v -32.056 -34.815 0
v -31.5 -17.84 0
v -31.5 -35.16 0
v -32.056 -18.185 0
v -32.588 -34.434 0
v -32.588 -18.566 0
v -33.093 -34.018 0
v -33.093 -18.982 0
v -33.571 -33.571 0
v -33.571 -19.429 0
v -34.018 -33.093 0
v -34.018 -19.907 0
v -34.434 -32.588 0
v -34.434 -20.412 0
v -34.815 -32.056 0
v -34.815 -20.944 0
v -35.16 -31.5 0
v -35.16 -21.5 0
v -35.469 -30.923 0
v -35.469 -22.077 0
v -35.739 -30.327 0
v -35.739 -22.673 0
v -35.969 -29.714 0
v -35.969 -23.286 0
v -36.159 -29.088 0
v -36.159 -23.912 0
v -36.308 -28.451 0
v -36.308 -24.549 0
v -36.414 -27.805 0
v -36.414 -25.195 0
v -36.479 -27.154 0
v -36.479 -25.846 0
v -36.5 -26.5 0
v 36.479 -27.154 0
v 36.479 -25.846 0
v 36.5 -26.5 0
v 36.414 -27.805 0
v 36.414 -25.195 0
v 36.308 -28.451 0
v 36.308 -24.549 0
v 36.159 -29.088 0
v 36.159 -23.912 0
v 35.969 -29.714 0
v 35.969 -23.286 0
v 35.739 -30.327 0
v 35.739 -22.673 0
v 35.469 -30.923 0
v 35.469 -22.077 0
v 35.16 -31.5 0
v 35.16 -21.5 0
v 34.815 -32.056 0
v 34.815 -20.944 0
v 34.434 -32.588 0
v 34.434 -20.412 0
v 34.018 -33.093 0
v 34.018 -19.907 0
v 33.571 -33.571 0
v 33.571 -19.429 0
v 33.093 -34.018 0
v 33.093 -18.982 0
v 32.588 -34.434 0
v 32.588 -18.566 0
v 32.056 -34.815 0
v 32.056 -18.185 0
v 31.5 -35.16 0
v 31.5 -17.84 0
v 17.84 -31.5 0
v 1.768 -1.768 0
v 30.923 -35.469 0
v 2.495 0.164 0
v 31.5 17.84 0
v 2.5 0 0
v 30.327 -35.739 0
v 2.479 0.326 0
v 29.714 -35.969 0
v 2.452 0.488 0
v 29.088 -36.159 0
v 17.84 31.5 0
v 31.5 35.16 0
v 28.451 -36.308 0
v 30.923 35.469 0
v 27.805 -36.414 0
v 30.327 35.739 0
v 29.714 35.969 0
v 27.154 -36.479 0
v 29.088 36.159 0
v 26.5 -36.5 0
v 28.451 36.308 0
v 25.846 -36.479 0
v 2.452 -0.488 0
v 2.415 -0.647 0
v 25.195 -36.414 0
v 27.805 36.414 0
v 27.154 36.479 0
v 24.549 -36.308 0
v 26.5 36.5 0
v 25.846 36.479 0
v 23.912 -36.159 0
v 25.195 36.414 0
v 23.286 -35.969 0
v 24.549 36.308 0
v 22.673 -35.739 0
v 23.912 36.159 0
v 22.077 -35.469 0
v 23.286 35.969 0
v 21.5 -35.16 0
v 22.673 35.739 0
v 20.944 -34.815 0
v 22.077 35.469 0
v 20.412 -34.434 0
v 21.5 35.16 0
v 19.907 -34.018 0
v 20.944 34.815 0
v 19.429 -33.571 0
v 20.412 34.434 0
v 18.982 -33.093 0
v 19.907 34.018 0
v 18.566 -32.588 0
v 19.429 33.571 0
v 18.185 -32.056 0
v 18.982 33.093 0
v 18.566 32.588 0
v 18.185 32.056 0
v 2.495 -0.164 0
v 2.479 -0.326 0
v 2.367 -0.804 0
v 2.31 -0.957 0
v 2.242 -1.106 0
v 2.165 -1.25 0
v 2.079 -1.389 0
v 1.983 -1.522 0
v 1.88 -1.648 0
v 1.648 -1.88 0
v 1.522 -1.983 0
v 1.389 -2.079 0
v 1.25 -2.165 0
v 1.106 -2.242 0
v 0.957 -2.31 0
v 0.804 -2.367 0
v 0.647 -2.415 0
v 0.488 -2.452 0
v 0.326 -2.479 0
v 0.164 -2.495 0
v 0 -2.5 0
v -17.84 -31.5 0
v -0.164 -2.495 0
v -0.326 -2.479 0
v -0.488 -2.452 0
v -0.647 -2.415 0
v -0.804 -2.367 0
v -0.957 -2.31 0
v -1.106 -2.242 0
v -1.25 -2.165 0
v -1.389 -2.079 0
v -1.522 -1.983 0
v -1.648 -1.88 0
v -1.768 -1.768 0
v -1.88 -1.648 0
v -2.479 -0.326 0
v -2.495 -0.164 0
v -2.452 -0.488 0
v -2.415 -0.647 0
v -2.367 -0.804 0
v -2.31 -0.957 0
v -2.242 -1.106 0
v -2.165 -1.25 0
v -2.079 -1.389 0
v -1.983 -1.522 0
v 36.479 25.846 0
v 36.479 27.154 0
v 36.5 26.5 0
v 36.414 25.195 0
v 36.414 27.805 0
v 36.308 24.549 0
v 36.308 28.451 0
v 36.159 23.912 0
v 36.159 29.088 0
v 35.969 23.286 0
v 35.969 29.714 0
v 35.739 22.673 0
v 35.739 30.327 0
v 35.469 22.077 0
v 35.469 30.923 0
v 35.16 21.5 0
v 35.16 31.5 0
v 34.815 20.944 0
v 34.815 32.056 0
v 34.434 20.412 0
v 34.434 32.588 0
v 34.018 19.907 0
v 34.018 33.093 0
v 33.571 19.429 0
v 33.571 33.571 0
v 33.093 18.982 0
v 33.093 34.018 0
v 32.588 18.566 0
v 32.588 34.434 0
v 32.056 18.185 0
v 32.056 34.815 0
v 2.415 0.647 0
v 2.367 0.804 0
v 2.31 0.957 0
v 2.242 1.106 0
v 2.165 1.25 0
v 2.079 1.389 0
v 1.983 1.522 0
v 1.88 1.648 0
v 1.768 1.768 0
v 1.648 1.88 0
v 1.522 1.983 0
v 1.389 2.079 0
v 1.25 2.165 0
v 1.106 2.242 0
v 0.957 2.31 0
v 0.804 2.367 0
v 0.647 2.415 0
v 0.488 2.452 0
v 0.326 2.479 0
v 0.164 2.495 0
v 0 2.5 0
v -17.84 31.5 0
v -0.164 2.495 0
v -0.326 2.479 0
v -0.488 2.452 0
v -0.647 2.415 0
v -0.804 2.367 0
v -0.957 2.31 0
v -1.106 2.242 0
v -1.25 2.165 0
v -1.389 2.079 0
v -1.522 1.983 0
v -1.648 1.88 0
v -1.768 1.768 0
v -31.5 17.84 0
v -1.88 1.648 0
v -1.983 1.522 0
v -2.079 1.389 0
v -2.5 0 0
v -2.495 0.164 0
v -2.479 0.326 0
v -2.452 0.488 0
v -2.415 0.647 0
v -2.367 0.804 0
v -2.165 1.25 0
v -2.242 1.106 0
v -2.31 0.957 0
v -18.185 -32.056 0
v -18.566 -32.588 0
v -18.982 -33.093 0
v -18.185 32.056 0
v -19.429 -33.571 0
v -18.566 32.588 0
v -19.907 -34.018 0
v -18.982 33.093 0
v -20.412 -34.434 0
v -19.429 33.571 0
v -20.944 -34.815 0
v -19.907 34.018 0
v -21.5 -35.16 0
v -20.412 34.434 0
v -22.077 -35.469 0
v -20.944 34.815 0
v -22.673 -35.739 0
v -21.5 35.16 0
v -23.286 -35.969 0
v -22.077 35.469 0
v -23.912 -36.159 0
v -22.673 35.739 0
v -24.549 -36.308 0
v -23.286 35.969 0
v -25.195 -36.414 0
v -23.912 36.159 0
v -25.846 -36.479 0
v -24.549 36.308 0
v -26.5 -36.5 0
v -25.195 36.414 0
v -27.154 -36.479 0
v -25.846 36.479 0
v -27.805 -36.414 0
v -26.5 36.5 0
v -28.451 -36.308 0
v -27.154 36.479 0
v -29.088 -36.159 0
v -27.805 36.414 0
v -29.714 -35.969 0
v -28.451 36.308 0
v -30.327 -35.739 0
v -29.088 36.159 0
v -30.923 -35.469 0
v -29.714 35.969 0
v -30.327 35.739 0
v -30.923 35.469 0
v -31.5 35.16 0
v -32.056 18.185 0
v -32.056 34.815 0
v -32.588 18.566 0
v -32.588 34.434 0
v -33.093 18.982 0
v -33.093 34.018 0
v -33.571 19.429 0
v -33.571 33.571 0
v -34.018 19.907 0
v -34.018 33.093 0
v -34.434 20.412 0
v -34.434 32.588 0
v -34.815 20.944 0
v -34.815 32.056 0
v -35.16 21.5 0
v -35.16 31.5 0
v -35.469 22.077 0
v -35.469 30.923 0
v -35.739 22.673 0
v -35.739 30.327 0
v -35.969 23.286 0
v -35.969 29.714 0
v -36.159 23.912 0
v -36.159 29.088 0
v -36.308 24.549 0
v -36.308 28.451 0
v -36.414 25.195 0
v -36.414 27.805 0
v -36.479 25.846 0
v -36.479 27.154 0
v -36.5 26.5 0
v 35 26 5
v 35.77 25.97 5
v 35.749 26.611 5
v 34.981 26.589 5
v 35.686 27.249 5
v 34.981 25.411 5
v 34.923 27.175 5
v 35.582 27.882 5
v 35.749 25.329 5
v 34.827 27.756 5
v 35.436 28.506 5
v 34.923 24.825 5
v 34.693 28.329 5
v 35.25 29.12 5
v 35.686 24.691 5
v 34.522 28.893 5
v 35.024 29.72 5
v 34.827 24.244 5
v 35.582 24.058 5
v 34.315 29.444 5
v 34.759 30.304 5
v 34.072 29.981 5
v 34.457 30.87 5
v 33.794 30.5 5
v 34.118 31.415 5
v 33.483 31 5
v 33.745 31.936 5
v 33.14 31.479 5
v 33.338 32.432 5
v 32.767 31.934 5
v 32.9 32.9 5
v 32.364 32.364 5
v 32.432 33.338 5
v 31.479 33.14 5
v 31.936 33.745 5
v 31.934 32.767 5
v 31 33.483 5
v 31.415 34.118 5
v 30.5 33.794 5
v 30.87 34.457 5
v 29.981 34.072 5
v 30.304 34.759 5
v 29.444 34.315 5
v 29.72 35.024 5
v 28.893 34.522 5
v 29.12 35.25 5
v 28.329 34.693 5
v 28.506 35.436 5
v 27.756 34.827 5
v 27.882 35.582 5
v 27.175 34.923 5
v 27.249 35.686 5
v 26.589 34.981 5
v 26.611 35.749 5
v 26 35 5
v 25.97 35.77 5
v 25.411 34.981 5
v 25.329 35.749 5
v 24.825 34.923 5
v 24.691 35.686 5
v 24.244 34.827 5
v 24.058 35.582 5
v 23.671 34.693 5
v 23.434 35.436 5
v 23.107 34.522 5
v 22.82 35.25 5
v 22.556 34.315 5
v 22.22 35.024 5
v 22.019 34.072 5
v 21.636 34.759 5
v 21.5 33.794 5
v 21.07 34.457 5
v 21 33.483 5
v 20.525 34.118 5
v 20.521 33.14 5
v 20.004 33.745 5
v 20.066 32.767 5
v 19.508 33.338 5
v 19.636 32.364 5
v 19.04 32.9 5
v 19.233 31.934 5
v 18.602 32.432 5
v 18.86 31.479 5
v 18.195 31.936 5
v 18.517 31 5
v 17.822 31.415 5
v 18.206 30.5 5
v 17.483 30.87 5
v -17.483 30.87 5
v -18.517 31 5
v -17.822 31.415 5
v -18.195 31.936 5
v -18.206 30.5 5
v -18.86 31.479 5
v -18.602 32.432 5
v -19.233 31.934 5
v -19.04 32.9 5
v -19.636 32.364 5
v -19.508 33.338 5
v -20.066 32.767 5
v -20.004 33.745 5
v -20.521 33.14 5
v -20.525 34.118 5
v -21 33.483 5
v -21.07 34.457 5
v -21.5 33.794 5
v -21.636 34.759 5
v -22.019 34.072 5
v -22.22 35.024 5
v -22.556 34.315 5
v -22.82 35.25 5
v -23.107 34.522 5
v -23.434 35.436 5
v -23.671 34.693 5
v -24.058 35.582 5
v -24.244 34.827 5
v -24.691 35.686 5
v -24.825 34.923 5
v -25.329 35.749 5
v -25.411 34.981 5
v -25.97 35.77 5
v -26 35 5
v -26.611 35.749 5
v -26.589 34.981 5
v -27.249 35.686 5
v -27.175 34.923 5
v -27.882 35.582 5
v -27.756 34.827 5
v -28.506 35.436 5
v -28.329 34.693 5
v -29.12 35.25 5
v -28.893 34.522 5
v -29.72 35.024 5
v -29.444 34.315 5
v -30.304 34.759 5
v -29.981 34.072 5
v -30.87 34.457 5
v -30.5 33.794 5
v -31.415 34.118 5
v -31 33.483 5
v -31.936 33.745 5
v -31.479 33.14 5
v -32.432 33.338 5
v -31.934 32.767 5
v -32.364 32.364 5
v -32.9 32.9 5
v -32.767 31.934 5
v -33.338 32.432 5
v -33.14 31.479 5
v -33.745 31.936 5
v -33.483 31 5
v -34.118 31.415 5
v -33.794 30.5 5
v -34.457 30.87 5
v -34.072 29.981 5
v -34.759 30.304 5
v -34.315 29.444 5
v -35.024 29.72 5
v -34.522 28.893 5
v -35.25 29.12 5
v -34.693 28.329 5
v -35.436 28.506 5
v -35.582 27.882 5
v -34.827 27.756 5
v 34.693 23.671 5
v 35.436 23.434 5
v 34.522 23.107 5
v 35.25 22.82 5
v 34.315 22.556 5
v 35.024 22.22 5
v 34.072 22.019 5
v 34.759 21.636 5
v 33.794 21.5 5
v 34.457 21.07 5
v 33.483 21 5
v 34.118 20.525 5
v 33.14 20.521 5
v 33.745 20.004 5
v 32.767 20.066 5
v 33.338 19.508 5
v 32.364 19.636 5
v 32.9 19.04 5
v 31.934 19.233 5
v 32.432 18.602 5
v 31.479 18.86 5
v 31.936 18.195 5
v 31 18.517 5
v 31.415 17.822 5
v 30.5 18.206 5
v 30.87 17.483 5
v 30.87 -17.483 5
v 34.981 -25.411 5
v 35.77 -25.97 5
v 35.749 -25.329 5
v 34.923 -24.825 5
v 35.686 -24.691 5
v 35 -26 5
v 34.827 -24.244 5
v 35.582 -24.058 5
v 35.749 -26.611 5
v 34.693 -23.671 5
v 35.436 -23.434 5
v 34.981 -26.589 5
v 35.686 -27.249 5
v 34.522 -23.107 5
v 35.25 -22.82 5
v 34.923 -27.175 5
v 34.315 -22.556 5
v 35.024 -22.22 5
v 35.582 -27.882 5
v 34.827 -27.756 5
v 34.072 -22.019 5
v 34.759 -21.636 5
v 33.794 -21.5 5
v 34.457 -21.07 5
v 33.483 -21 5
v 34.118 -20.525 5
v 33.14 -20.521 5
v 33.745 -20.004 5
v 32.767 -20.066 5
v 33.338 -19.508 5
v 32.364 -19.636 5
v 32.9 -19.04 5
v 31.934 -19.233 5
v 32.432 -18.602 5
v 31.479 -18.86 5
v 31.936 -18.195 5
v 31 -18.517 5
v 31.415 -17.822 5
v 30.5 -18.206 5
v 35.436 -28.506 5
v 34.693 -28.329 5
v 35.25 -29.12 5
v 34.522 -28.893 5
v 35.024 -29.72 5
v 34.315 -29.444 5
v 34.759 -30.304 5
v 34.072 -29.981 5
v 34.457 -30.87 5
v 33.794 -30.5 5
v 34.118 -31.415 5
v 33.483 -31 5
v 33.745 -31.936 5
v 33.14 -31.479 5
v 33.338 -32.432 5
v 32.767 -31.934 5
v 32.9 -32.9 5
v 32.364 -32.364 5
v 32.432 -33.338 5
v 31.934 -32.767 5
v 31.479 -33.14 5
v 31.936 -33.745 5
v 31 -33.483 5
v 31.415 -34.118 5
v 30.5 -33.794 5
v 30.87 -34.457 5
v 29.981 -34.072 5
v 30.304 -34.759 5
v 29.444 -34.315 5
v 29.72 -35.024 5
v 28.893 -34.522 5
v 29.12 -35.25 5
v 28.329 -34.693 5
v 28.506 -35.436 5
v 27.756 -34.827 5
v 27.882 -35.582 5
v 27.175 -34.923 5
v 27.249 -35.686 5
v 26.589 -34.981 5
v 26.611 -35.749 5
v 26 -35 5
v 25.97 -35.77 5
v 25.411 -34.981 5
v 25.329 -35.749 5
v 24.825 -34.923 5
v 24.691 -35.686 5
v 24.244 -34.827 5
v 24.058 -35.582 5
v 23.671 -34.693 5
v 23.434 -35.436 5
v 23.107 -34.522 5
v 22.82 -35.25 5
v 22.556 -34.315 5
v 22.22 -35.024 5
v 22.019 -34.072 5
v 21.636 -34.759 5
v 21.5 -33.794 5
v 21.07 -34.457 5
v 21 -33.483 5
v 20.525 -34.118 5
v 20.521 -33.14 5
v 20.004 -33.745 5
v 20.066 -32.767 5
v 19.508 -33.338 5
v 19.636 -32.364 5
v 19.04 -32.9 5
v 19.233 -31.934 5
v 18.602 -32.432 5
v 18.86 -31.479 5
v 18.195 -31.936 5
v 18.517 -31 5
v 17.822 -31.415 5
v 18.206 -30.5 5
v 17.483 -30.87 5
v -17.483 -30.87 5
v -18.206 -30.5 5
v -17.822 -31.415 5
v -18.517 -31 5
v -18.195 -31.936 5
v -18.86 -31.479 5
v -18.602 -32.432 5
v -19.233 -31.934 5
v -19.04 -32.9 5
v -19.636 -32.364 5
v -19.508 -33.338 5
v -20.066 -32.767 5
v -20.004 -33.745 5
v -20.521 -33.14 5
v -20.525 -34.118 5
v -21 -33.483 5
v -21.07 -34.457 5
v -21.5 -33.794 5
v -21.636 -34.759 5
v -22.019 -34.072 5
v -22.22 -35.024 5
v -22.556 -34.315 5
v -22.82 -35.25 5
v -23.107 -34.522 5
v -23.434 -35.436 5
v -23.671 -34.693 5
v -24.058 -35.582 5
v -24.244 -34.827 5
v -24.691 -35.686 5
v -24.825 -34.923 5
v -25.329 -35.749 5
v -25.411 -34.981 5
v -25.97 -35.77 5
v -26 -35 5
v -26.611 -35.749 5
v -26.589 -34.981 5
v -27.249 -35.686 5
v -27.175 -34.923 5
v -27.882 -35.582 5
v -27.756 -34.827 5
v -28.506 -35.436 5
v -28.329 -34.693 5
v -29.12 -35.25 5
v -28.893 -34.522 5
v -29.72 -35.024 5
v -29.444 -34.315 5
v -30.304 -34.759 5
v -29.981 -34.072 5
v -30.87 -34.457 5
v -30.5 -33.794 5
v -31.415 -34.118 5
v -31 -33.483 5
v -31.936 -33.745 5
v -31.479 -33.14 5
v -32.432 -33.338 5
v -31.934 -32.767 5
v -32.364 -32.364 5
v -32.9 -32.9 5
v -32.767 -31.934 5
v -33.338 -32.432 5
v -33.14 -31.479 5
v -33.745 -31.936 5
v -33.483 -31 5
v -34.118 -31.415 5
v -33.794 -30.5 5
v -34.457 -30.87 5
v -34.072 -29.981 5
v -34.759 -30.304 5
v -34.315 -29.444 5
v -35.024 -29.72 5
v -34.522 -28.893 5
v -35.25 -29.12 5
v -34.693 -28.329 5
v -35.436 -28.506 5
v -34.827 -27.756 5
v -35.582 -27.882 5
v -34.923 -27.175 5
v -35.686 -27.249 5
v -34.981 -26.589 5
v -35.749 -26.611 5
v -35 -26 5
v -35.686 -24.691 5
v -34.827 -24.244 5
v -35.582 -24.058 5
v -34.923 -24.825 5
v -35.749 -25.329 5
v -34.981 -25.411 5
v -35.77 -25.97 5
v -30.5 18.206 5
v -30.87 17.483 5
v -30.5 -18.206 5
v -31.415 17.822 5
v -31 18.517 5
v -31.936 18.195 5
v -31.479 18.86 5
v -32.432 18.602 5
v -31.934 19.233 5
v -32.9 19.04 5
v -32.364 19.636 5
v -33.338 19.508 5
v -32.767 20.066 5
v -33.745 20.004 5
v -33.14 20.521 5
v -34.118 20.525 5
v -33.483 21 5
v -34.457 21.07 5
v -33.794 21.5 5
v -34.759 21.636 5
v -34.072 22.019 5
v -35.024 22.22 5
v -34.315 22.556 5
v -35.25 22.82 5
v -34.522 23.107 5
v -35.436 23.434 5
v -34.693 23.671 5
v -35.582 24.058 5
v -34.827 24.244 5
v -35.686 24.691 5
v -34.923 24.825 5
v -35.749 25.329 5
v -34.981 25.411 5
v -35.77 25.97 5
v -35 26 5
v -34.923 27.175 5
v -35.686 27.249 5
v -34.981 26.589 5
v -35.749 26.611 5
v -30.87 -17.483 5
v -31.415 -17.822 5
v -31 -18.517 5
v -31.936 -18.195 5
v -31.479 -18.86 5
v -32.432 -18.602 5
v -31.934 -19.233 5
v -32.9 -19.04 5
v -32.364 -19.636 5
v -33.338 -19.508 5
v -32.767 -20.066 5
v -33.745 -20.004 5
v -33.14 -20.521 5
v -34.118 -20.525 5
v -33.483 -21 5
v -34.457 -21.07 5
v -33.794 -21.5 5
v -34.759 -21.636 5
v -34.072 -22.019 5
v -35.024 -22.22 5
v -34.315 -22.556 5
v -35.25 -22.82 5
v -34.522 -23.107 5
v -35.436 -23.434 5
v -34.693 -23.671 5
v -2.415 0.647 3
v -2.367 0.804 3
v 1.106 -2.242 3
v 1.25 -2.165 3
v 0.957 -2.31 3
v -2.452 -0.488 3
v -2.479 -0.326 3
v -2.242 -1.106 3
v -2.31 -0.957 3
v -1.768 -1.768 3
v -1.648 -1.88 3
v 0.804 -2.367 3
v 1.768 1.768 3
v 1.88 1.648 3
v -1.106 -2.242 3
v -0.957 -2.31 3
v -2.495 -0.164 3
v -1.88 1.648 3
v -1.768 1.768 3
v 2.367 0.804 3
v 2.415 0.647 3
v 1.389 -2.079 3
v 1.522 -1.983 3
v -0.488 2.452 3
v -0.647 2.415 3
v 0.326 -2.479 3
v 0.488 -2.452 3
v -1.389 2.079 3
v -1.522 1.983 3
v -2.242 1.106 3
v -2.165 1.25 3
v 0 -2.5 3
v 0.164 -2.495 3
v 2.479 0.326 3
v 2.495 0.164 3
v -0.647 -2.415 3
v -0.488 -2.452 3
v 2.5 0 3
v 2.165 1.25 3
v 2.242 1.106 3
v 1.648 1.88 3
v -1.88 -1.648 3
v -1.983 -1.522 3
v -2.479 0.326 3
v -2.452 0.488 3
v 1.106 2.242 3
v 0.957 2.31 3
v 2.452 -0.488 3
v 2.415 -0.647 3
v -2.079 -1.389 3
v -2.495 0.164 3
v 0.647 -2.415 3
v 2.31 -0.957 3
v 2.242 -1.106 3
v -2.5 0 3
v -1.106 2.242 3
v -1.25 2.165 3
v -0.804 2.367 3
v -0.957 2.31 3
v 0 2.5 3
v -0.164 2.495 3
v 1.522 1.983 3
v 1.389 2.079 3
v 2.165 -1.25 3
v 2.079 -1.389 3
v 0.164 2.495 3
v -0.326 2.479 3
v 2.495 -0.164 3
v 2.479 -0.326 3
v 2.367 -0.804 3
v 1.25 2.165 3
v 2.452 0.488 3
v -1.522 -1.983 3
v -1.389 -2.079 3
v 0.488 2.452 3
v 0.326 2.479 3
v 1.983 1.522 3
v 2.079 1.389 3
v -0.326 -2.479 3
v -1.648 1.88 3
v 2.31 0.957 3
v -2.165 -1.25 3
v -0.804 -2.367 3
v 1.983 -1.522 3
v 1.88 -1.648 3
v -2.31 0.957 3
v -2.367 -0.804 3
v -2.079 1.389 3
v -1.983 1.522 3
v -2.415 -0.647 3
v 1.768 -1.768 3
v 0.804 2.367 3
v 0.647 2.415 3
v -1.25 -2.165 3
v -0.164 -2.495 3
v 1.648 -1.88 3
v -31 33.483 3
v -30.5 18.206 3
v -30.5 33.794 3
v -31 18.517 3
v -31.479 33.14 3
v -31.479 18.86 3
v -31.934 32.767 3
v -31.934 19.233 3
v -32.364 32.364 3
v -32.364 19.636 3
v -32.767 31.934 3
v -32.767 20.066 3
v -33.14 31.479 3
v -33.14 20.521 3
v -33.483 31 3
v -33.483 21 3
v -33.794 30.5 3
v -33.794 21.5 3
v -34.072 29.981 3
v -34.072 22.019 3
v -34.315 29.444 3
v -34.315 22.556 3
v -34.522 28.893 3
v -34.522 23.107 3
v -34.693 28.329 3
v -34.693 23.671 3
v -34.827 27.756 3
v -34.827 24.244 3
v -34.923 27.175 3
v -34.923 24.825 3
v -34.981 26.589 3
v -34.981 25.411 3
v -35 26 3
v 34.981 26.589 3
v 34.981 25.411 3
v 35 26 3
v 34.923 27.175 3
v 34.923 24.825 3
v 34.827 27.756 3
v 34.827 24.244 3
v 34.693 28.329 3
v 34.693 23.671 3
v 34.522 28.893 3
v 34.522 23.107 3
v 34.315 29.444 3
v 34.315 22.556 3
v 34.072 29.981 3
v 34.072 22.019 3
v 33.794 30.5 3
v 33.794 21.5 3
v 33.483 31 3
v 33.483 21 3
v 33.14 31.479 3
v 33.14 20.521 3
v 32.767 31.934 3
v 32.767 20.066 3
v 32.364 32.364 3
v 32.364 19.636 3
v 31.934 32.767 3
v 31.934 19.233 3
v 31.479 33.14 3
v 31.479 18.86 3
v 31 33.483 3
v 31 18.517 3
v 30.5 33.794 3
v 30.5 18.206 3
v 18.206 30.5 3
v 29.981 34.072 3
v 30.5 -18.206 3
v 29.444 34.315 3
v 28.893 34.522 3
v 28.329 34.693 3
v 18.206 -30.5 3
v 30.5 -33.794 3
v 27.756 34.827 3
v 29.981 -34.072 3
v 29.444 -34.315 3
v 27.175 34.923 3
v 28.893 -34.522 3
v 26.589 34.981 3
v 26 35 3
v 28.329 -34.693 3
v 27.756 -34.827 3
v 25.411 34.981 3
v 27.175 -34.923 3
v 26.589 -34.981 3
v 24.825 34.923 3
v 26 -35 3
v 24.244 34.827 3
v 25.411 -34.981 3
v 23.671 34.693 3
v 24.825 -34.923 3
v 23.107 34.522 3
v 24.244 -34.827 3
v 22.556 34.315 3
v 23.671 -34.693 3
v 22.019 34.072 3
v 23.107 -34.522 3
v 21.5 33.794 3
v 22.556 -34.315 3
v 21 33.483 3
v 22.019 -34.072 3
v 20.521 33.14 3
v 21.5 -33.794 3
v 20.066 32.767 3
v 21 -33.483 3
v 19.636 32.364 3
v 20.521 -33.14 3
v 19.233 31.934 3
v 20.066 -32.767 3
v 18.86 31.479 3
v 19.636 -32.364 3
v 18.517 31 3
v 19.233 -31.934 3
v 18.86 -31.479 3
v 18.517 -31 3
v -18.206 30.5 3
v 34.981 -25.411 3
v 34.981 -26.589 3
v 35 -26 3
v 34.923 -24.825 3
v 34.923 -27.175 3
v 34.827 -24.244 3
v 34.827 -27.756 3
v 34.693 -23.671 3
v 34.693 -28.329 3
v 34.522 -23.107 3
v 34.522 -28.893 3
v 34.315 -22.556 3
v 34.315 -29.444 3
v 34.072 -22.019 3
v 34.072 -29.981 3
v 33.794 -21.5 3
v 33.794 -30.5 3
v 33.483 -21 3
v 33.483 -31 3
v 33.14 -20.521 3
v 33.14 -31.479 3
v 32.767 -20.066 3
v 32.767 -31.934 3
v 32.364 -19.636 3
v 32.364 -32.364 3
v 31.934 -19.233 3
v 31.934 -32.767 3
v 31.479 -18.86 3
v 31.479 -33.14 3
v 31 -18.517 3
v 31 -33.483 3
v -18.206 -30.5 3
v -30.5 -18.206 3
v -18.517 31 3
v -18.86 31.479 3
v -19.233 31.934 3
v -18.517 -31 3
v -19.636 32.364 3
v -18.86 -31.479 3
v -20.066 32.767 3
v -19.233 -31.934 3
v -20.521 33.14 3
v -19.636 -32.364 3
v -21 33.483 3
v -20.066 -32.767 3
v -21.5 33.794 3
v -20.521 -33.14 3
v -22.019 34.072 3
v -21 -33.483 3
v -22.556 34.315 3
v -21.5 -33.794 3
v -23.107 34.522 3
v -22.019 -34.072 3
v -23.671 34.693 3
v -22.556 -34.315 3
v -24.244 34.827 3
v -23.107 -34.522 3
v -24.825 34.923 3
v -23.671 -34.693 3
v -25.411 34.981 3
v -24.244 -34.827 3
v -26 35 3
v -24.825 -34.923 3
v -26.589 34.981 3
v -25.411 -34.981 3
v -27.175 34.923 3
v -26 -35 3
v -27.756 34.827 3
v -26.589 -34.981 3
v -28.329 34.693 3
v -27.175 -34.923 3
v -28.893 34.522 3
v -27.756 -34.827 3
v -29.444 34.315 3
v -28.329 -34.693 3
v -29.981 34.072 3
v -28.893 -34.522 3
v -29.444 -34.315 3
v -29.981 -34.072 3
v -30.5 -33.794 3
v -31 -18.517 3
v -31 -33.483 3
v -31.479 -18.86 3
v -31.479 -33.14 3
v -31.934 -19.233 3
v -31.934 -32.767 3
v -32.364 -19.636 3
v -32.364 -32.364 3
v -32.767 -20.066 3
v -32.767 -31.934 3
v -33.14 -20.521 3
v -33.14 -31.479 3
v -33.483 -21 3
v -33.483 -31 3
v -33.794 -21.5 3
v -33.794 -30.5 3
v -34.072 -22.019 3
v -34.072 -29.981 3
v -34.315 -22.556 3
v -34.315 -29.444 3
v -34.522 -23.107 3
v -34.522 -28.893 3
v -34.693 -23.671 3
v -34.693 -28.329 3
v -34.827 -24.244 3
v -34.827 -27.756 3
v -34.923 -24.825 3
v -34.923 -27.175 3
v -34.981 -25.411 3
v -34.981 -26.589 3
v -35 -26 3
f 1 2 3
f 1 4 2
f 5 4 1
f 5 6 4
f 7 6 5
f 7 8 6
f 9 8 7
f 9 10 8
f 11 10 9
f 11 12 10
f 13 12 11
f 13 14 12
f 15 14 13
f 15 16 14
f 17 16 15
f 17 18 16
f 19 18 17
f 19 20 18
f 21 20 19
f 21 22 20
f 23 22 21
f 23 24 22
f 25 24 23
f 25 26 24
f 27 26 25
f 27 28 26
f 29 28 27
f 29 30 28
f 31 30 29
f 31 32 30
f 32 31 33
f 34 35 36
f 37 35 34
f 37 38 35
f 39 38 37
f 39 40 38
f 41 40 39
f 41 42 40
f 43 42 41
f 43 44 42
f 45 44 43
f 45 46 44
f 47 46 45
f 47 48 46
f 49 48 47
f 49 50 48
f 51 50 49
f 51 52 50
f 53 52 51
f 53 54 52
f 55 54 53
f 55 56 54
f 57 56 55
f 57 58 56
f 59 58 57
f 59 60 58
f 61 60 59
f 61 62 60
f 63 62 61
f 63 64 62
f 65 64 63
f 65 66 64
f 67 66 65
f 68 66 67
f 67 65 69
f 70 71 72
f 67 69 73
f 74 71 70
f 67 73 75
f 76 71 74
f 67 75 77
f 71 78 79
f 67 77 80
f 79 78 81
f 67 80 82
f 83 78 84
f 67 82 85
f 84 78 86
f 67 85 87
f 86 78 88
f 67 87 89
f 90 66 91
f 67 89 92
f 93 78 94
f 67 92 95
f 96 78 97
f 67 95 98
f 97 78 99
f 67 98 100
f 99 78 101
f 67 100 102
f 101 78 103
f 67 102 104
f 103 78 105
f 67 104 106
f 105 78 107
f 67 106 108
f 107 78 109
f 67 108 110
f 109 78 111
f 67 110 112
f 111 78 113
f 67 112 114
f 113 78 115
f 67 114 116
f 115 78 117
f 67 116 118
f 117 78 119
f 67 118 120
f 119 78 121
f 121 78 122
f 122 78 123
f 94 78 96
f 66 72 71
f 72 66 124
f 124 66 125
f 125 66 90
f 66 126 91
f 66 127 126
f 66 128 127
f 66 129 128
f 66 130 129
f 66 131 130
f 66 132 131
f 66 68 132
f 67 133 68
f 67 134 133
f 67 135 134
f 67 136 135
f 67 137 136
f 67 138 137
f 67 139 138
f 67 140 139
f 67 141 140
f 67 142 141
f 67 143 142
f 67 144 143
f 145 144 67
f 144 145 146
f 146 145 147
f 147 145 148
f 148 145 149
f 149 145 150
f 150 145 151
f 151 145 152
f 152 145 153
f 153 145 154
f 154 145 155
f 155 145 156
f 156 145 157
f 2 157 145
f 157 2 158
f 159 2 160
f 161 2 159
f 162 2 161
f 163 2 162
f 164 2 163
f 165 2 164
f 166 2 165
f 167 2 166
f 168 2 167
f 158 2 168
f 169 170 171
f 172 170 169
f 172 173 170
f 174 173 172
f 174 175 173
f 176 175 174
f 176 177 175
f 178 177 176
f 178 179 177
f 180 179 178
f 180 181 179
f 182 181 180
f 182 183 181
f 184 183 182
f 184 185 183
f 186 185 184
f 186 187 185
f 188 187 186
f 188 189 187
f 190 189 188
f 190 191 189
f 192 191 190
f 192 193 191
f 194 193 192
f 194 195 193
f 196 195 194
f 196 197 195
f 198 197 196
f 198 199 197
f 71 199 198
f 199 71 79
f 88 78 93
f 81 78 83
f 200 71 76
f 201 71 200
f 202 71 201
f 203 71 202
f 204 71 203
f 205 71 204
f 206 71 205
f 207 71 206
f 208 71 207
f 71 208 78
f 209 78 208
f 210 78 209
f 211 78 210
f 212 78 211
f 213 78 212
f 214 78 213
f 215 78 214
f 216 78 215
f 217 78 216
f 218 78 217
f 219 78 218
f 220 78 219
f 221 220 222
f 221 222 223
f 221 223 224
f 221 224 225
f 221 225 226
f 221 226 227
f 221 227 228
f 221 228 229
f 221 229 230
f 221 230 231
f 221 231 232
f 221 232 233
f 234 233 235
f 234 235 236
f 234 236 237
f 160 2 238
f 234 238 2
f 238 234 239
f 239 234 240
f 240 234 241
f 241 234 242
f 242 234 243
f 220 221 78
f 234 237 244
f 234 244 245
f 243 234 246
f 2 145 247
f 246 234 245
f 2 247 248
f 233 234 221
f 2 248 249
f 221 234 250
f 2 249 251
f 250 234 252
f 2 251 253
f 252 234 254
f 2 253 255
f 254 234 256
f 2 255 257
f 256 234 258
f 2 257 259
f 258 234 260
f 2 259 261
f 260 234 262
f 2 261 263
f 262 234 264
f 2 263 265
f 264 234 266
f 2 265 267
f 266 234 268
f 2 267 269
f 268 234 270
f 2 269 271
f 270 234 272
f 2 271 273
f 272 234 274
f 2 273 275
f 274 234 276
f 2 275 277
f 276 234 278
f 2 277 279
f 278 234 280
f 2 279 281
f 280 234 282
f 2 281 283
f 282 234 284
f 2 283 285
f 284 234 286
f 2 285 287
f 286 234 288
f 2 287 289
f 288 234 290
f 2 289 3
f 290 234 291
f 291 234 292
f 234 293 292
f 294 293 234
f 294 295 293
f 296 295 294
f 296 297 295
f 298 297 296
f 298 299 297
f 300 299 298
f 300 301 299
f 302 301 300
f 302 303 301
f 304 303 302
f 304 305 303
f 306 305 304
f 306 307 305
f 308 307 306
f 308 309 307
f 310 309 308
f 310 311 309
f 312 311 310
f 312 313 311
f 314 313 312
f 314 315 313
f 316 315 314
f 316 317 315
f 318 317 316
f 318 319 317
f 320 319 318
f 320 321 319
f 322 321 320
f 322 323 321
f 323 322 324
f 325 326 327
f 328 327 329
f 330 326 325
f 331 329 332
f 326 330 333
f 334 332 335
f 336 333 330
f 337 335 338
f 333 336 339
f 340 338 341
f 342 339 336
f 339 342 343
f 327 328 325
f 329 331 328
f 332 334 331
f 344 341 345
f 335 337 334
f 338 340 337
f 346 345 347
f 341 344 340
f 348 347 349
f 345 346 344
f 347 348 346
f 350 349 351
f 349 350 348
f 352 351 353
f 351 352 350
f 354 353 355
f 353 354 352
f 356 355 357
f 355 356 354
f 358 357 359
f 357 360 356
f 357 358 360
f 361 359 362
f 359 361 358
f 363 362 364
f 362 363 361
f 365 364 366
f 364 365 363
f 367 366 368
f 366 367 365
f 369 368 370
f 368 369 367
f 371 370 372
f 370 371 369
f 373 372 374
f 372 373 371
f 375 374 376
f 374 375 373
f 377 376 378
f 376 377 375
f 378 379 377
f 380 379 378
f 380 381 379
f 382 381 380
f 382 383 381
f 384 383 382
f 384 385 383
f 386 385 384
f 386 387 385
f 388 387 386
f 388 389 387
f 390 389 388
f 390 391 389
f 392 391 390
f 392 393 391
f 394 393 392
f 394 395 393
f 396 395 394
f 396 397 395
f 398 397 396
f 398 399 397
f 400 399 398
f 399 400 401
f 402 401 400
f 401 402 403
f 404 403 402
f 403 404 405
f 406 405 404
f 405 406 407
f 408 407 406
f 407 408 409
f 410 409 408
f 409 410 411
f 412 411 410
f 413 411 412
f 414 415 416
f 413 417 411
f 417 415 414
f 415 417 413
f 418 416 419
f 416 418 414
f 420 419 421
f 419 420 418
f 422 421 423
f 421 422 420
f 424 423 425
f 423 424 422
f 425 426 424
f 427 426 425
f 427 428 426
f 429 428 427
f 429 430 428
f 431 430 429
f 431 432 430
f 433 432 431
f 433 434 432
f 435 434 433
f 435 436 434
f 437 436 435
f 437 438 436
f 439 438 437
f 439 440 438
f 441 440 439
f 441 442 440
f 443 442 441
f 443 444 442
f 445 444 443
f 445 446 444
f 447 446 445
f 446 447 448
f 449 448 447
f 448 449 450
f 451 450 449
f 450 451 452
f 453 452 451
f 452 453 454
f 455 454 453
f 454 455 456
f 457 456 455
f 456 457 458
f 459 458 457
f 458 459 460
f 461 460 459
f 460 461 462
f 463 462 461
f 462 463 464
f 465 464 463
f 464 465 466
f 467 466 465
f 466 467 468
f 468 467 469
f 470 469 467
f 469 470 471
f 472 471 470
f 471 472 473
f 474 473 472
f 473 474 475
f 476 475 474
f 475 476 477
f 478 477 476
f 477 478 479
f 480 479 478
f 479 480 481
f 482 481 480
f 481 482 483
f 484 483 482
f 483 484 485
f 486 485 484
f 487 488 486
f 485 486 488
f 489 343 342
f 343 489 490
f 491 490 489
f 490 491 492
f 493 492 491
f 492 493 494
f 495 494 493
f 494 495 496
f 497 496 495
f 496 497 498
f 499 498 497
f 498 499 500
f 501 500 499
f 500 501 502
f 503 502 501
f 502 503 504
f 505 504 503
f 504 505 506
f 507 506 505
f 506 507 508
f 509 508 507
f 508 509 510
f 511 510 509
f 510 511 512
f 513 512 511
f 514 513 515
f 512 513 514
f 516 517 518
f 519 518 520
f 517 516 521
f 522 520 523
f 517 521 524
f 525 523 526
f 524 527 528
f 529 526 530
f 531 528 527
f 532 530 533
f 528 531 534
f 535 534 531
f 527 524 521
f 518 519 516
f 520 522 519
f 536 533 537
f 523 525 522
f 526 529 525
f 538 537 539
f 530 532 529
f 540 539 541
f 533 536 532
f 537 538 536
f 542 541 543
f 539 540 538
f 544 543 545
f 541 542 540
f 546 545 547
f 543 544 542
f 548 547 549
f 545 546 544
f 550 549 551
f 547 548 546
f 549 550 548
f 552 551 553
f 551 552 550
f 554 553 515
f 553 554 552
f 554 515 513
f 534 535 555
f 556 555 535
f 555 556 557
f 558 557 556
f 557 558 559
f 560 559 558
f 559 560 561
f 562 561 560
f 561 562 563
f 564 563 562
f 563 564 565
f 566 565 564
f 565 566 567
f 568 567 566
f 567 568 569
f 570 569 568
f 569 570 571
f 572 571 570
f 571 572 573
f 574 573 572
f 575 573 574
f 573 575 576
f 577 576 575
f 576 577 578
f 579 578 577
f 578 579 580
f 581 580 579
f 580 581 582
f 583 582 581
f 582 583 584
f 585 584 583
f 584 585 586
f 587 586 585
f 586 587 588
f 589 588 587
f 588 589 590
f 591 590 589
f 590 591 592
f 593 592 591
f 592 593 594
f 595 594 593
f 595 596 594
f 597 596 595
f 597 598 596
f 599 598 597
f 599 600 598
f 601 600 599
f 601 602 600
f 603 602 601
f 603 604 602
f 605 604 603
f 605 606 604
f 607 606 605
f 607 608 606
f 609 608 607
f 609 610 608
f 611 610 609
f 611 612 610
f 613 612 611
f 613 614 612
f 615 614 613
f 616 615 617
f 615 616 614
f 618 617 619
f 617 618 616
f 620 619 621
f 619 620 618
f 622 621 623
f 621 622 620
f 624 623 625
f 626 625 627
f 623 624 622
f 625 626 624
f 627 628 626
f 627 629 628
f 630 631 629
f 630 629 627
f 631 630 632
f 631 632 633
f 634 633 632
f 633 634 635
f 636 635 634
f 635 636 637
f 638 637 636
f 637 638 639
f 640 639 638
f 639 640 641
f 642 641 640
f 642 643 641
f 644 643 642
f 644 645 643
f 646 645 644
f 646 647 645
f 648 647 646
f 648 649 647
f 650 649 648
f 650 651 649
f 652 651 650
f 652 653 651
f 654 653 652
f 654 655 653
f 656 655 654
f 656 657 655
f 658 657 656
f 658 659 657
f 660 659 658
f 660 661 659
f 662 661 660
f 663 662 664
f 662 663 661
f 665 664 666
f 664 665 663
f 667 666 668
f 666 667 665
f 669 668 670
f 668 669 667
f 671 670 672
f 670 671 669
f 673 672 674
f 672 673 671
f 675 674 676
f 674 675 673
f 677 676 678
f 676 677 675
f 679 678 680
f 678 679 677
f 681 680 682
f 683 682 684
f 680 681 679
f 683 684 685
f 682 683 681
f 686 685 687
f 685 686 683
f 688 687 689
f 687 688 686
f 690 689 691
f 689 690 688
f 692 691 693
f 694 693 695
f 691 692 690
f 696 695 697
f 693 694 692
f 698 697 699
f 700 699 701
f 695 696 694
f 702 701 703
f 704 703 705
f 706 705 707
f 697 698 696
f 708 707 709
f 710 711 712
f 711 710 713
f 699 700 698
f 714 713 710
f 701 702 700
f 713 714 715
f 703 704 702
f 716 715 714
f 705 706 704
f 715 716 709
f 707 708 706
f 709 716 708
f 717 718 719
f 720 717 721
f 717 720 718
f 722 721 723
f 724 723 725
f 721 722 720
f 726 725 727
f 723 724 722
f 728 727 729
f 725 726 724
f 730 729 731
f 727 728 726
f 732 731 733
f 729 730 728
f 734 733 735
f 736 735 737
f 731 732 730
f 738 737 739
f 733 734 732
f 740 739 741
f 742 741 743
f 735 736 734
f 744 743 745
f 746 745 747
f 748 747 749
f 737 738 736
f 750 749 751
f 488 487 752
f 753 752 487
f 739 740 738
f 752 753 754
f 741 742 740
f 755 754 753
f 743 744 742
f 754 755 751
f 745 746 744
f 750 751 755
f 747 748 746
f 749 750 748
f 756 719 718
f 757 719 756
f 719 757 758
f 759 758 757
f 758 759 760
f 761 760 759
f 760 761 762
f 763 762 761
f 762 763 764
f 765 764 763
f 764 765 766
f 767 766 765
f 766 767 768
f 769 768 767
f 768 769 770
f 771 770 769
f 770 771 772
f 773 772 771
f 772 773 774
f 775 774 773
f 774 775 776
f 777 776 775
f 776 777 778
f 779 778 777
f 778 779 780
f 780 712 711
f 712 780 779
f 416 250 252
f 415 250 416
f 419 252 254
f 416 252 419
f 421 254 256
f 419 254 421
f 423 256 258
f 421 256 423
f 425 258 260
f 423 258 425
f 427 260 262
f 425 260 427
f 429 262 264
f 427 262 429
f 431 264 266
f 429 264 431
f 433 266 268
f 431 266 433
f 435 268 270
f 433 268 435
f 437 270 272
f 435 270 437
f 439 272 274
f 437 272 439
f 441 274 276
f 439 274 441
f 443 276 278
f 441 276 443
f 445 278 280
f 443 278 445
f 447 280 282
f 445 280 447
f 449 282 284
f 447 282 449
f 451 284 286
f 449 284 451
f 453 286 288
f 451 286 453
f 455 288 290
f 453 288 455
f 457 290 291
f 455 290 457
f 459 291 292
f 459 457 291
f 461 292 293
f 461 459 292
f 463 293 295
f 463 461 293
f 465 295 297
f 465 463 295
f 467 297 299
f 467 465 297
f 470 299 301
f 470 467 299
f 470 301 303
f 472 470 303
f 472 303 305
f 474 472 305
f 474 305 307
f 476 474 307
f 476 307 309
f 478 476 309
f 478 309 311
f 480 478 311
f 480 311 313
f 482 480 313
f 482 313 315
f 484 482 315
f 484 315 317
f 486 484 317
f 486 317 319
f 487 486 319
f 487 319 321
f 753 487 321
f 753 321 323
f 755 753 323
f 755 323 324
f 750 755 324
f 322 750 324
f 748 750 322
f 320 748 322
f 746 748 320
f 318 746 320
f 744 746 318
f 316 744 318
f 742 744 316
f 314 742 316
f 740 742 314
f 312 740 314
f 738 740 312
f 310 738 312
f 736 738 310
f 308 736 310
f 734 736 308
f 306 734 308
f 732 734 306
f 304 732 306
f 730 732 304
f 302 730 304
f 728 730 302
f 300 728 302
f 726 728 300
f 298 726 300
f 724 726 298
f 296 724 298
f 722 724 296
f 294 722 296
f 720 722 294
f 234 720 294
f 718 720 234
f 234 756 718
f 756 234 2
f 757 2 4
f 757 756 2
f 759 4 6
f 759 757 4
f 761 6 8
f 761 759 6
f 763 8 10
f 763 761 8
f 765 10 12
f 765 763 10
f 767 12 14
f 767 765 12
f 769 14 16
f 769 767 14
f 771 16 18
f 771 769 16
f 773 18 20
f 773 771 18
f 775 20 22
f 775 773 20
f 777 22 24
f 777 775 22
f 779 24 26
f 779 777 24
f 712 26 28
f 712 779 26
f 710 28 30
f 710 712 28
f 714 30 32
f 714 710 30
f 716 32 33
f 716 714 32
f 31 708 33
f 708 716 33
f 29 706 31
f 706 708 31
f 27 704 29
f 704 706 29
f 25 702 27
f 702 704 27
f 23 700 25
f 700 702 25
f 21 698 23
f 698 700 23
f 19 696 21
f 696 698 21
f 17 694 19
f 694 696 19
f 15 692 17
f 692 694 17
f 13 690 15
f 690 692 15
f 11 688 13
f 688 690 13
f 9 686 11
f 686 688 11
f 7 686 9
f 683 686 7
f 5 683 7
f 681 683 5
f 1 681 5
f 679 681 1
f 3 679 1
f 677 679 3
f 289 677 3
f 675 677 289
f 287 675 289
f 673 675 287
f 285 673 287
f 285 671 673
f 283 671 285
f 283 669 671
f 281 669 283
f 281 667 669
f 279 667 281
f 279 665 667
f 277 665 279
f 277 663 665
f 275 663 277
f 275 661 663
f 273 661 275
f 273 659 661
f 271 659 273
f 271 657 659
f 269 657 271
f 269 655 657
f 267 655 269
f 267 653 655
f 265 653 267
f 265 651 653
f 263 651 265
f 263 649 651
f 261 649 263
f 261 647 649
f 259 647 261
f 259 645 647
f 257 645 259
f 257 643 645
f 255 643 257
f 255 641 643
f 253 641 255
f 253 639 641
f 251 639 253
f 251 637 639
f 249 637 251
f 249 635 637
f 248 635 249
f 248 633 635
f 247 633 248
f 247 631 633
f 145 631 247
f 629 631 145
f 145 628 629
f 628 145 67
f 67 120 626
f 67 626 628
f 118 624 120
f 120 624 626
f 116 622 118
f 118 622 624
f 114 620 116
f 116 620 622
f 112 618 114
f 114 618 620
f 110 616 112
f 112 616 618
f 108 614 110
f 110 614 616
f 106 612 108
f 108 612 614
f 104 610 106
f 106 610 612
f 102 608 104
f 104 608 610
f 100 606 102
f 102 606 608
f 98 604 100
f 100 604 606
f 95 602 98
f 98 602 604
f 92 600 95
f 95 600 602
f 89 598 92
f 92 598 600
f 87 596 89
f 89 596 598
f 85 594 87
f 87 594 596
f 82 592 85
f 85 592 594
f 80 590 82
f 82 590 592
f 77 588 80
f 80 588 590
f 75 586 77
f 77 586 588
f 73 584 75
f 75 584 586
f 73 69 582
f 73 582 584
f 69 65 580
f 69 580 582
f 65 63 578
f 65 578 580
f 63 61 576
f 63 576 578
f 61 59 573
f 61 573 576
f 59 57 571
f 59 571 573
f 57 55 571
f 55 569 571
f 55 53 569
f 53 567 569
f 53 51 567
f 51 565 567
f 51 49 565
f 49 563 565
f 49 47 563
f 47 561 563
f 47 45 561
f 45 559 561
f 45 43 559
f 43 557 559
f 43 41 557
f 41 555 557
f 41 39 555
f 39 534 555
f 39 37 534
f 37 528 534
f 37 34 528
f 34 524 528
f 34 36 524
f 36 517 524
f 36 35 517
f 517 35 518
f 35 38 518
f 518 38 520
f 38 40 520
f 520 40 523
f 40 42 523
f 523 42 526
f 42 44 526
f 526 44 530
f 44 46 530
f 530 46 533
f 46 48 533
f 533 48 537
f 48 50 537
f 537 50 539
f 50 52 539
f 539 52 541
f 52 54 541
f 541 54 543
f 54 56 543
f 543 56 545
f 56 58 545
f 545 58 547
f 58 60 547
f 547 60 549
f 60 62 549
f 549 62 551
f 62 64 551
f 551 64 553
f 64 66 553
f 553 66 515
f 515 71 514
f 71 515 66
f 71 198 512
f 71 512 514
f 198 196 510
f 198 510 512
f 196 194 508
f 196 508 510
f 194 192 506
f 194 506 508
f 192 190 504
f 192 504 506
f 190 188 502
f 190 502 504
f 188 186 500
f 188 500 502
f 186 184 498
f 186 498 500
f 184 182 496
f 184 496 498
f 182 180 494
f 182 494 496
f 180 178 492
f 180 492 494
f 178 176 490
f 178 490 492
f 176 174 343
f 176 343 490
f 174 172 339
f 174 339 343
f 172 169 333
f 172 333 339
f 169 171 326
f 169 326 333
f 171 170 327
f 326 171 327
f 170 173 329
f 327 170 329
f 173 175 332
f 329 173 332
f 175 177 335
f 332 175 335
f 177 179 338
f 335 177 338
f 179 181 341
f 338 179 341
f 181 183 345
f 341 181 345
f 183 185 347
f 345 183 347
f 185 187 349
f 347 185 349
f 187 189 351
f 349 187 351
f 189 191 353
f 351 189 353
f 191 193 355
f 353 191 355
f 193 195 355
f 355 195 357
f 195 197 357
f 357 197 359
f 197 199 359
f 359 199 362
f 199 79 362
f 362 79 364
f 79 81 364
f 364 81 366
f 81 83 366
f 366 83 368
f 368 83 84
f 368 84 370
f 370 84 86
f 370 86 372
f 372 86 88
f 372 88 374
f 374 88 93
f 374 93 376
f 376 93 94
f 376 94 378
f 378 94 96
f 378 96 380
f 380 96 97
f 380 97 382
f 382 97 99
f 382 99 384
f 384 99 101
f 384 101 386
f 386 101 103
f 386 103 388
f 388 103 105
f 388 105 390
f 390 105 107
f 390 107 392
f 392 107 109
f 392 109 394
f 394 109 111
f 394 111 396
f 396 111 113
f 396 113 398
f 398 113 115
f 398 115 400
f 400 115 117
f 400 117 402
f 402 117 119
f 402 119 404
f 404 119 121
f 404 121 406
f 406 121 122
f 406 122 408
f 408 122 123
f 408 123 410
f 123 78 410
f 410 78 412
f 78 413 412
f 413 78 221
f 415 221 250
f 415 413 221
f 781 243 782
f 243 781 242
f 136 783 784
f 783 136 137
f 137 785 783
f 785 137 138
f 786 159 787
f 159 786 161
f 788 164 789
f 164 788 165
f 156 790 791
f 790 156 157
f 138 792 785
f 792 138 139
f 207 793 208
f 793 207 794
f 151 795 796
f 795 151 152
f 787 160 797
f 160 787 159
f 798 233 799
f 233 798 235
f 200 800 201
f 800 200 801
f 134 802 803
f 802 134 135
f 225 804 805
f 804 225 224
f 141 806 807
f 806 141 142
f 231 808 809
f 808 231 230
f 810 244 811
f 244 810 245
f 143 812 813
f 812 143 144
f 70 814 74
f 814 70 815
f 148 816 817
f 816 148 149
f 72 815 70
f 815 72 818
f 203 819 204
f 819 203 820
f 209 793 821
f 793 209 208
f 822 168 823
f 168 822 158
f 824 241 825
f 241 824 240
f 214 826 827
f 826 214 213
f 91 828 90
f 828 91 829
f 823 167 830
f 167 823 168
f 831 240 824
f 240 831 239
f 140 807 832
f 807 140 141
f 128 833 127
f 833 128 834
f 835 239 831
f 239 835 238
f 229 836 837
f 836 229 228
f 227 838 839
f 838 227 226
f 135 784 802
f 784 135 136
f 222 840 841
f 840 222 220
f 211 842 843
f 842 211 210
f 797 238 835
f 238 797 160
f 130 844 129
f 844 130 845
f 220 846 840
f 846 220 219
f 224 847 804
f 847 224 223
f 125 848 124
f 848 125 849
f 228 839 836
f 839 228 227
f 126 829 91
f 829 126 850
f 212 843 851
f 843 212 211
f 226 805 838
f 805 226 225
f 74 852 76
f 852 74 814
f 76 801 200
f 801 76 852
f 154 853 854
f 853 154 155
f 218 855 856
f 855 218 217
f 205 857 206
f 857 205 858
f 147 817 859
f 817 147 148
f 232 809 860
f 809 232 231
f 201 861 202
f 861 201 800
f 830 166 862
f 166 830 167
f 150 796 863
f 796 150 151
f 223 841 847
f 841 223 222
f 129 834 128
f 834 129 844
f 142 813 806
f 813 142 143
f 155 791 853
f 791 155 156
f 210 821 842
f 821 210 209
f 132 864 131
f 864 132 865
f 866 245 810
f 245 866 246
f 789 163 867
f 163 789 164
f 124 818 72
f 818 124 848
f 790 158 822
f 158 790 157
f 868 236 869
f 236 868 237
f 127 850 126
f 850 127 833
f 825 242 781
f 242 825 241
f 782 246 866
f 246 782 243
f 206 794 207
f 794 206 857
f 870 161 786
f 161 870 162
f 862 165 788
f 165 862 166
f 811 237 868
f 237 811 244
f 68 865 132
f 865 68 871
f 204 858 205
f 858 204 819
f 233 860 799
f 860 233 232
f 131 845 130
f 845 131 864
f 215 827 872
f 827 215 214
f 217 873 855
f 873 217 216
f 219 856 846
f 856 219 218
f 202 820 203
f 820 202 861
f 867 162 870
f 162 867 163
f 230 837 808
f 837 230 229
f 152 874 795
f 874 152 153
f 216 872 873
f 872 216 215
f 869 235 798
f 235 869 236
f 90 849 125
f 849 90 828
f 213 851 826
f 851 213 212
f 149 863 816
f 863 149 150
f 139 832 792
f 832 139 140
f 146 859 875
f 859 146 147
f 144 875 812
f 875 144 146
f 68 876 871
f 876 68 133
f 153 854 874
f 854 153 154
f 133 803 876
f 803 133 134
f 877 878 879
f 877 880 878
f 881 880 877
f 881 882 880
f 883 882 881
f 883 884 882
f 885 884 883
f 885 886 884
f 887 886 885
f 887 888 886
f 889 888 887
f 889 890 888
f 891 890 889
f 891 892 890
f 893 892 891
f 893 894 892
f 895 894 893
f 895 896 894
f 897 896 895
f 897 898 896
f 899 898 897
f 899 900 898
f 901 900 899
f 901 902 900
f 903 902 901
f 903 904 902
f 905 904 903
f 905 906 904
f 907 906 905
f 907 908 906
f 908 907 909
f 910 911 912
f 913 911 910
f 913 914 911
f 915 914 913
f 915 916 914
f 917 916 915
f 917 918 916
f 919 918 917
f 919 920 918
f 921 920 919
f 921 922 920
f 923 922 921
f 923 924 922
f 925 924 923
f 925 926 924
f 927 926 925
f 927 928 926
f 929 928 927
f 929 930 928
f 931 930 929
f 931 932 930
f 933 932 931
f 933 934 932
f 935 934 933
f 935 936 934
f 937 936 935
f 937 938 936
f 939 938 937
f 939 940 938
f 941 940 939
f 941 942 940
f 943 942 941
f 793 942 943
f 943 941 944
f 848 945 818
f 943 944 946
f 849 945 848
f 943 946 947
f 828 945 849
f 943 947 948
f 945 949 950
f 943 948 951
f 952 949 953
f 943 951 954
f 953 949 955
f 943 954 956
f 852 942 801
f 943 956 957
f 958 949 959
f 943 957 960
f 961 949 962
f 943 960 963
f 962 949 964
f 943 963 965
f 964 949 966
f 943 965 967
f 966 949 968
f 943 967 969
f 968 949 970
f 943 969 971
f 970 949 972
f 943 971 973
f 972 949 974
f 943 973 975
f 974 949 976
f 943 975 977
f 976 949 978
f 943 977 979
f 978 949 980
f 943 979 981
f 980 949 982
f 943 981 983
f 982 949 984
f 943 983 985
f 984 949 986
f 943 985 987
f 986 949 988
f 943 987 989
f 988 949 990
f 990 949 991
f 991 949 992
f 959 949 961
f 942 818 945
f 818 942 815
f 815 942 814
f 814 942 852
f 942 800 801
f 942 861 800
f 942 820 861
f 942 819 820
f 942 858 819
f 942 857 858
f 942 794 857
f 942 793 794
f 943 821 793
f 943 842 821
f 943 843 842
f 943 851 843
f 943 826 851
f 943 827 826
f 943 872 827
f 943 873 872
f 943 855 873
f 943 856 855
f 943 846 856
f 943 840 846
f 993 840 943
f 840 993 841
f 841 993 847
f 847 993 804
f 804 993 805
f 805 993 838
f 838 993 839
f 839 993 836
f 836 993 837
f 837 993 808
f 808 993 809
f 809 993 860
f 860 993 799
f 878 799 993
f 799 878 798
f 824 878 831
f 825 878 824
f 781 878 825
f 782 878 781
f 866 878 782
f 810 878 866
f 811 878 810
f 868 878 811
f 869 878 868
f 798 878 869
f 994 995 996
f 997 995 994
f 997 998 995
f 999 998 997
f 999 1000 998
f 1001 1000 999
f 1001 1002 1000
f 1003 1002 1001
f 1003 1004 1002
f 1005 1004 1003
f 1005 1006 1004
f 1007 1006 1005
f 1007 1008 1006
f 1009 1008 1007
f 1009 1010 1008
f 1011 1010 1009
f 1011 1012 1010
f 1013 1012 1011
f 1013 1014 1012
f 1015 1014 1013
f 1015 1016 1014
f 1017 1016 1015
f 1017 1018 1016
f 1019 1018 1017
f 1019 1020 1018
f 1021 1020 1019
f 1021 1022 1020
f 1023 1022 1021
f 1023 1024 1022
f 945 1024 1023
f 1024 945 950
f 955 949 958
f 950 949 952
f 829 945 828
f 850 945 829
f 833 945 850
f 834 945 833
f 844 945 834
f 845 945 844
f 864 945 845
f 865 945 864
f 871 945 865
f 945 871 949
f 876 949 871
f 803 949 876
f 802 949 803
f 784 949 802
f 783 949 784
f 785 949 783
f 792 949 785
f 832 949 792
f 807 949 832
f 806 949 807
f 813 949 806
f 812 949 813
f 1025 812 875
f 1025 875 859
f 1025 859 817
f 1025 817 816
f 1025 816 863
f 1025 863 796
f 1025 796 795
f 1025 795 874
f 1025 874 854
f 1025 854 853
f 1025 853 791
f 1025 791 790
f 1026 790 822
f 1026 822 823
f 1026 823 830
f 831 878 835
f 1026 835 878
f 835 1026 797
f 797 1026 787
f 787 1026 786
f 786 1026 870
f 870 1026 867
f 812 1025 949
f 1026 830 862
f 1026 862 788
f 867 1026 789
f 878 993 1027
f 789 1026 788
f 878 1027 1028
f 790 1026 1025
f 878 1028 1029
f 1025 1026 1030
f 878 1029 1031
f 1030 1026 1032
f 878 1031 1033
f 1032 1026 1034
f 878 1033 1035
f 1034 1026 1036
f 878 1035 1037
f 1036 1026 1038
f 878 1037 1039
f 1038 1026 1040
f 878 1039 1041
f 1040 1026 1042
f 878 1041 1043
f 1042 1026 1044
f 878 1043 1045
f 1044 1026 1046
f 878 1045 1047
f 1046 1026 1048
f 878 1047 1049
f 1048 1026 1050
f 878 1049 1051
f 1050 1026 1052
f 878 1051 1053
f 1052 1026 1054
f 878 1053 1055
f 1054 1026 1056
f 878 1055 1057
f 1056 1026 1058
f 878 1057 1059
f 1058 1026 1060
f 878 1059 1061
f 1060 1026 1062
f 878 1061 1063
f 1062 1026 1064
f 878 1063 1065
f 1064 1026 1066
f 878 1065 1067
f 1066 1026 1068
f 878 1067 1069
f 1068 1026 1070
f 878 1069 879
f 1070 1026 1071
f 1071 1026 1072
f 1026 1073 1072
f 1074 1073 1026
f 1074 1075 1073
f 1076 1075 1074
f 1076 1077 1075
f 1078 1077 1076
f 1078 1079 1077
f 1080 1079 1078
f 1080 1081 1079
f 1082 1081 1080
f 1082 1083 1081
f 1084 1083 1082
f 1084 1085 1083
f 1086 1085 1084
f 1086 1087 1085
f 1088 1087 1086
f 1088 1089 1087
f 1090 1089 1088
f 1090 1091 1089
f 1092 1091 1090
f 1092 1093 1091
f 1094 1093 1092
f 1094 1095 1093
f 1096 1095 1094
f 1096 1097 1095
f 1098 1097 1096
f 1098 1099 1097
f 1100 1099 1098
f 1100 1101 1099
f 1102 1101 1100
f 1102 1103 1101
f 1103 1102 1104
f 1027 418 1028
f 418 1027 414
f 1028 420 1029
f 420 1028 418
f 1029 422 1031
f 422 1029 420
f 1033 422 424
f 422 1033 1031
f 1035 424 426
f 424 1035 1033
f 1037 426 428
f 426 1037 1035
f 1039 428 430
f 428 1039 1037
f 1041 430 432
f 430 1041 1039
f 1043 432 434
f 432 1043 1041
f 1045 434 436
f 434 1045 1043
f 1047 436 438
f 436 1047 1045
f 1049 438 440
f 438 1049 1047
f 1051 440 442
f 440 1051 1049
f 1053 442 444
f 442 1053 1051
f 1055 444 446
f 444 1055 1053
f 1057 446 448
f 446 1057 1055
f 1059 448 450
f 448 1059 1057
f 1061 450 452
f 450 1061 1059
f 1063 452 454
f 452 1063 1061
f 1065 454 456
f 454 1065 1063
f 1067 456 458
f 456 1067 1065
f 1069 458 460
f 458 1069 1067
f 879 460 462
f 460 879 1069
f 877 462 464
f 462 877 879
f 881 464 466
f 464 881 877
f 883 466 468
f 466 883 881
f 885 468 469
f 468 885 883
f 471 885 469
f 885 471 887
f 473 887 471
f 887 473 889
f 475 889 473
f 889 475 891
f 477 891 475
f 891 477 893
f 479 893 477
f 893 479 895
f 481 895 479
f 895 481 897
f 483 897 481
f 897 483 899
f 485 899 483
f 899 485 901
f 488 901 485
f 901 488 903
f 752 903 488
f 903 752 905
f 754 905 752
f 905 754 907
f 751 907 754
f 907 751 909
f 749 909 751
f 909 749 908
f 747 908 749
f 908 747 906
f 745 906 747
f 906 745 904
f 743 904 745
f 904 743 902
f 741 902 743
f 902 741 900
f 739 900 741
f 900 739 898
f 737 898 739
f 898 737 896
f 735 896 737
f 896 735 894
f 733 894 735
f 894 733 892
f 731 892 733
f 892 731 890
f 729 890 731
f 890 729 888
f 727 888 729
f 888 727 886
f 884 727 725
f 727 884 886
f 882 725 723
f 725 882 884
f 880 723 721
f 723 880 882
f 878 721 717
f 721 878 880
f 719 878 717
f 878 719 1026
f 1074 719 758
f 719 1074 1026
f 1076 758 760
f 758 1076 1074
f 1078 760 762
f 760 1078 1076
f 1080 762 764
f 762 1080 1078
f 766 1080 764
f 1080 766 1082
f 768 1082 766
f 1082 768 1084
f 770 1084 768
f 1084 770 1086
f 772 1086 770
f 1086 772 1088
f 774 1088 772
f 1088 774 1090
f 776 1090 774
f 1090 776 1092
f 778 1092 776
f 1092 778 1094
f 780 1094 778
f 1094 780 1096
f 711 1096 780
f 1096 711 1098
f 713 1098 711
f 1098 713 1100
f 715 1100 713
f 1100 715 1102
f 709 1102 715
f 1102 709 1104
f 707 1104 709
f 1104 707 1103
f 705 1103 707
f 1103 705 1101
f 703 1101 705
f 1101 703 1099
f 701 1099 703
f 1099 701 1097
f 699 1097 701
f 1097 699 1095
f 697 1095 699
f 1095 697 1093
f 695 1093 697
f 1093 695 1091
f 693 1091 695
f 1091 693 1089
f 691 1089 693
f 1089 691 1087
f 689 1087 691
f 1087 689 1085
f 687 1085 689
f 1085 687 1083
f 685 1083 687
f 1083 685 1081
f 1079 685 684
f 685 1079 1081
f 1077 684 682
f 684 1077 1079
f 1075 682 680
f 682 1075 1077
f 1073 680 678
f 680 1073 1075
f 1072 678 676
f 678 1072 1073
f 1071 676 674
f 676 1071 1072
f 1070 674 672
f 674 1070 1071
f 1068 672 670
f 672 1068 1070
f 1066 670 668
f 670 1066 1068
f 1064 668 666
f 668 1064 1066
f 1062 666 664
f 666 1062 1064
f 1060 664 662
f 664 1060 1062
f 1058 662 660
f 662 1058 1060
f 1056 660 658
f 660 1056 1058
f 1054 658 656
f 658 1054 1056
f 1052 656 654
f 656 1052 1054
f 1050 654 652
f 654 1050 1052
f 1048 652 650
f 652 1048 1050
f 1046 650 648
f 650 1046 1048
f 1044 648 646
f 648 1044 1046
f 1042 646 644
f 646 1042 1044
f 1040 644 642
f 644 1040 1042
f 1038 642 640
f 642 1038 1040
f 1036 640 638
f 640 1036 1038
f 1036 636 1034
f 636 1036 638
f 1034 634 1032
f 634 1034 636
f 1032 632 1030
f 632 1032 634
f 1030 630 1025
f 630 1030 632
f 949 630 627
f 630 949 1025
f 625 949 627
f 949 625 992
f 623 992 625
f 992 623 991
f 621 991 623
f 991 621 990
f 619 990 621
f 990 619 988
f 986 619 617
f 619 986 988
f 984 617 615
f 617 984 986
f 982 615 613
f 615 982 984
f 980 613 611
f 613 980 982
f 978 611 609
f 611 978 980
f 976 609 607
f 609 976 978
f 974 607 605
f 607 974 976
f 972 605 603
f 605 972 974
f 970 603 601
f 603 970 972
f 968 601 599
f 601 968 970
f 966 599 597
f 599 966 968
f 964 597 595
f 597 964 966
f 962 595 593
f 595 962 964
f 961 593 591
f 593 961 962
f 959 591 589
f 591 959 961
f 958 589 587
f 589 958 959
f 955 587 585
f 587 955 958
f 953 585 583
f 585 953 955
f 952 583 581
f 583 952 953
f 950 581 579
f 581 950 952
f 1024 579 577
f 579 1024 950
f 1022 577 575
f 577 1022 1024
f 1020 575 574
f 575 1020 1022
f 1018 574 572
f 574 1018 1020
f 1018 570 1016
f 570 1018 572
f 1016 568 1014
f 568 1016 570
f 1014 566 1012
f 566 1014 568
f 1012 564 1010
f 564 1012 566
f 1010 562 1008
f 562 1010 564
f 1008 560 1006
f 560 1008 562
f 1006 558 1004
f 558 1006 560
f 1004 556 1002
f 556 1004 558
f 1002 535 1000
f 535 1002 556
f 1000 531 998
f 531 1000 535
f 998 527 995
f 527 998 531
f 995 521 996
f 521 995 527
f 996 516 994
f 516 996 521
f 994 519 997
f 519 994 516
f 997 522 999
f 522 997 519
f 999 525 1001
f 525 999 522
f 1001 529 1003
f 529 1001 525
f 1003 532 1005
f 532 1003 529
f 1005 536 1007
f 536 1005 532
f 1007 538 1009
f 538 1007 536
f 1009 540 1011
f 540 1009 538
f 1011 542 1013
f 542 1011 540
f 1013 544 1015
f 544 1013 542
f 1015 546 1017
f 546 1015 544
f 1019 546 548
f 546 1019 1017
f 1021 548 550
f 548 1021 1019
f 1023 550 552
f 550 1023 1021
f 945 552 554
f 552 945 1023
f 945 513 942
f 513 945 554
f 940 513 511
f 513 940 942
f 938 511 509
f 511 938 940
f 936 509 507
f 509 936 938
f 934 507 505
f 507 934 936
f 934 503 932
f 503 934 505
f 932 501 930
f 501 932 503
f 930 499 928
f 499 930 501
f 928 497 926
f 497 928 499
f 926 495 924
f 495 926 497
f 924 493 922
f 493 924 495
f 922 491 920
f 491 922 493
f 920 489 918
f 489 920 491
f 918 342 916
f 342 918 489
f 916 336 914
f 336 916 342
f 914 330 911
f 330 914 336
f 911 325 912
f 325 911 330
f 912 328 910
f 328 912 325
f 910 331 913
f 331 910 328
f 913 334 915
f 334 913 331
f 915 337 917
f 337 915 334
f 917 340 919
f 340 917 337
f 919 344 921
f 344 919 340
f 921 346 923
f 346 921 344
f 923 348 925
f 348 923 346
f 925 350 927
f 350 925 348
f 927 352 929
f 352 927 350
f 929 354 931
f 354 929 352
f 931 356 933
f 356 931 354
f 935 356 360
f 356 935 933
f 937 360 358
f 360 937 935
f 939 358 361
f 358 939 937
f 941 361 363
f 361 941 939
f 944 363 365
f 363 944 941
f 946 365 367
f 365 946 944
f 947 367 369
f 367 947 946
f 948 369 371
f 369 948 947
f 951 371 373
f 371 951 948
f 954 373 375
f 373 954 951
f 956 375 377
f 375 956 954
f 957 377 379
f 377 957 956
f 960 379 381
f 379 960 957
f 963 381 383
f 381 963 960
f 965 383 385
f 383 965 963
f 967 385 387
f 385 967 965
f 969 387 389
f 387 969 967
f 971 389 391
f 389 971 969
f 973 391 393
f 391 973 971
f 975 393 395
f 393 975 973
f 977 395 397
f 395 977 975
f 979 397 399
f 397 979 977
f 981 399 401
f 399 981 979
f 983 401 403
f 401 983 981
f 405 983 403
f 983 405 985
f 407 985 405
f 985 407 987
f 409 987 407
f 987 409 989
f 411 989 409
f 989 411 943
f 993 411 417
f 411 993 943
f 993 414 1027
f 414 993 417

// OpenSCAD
// ----- Castle Plate (bottom full-size, top tapered in) -----
square_size          = 63;   // main square width (mm)
protrusion           = 5;    // how much each corner circle extends beyond the square
thickness            = 5;    // total height of the plate
center_hole_diameter = 5;    // hole in the center

taper_scale          = 0.98; // top is 98% of bottom (adjust if needed)
$fn = 96;

// 2D outline for the plate
module castle_outline() {
    union() {
        square([square_size, square_size], center = true);

        // Four corner circles, offset inward so they only stick out 5 mm
        for (sx = [-1, 1])
        for (sy = [-1, 1])
            translate([sx * (square_size/2 - protrusion),
                       sy * (square_size/2 - protrusion)])
                circle(d = 2 * protrusion * 2); // 10 mm diameter -> 5 mm protrusion
    }
}

module castle_plate() {
    difference() {
        // *** Bottom full-size, top smaller ***
        linear_extrude(height = thickness, scale = taper_scale)
            castle_outline();

        // Center pull-out hole
        translate([0, 0, -1])
            cylinder(h = thickness + 2, d = center_hole_diameter);
    }
}

// Final: add the inner recess like before
difference() {
    castle_plate();

    // Inner recess, 2 mm deep (thickness - 3)
    translate([0, 0, 3])
    linear_extrude(thickness - 3)
    union() {
        square([square_size - 2, square_size - 2], center = true);
        for (sx = [-1, 1])
        for (sy = [-1, 1])
            translate([sx * (square_size/2 - protrusion - 0.5),
                       sy * (square_size/2 - protrusion - 0.5)])
                circle(d = (2 * protrusion * 2) - 2);
    }
}
